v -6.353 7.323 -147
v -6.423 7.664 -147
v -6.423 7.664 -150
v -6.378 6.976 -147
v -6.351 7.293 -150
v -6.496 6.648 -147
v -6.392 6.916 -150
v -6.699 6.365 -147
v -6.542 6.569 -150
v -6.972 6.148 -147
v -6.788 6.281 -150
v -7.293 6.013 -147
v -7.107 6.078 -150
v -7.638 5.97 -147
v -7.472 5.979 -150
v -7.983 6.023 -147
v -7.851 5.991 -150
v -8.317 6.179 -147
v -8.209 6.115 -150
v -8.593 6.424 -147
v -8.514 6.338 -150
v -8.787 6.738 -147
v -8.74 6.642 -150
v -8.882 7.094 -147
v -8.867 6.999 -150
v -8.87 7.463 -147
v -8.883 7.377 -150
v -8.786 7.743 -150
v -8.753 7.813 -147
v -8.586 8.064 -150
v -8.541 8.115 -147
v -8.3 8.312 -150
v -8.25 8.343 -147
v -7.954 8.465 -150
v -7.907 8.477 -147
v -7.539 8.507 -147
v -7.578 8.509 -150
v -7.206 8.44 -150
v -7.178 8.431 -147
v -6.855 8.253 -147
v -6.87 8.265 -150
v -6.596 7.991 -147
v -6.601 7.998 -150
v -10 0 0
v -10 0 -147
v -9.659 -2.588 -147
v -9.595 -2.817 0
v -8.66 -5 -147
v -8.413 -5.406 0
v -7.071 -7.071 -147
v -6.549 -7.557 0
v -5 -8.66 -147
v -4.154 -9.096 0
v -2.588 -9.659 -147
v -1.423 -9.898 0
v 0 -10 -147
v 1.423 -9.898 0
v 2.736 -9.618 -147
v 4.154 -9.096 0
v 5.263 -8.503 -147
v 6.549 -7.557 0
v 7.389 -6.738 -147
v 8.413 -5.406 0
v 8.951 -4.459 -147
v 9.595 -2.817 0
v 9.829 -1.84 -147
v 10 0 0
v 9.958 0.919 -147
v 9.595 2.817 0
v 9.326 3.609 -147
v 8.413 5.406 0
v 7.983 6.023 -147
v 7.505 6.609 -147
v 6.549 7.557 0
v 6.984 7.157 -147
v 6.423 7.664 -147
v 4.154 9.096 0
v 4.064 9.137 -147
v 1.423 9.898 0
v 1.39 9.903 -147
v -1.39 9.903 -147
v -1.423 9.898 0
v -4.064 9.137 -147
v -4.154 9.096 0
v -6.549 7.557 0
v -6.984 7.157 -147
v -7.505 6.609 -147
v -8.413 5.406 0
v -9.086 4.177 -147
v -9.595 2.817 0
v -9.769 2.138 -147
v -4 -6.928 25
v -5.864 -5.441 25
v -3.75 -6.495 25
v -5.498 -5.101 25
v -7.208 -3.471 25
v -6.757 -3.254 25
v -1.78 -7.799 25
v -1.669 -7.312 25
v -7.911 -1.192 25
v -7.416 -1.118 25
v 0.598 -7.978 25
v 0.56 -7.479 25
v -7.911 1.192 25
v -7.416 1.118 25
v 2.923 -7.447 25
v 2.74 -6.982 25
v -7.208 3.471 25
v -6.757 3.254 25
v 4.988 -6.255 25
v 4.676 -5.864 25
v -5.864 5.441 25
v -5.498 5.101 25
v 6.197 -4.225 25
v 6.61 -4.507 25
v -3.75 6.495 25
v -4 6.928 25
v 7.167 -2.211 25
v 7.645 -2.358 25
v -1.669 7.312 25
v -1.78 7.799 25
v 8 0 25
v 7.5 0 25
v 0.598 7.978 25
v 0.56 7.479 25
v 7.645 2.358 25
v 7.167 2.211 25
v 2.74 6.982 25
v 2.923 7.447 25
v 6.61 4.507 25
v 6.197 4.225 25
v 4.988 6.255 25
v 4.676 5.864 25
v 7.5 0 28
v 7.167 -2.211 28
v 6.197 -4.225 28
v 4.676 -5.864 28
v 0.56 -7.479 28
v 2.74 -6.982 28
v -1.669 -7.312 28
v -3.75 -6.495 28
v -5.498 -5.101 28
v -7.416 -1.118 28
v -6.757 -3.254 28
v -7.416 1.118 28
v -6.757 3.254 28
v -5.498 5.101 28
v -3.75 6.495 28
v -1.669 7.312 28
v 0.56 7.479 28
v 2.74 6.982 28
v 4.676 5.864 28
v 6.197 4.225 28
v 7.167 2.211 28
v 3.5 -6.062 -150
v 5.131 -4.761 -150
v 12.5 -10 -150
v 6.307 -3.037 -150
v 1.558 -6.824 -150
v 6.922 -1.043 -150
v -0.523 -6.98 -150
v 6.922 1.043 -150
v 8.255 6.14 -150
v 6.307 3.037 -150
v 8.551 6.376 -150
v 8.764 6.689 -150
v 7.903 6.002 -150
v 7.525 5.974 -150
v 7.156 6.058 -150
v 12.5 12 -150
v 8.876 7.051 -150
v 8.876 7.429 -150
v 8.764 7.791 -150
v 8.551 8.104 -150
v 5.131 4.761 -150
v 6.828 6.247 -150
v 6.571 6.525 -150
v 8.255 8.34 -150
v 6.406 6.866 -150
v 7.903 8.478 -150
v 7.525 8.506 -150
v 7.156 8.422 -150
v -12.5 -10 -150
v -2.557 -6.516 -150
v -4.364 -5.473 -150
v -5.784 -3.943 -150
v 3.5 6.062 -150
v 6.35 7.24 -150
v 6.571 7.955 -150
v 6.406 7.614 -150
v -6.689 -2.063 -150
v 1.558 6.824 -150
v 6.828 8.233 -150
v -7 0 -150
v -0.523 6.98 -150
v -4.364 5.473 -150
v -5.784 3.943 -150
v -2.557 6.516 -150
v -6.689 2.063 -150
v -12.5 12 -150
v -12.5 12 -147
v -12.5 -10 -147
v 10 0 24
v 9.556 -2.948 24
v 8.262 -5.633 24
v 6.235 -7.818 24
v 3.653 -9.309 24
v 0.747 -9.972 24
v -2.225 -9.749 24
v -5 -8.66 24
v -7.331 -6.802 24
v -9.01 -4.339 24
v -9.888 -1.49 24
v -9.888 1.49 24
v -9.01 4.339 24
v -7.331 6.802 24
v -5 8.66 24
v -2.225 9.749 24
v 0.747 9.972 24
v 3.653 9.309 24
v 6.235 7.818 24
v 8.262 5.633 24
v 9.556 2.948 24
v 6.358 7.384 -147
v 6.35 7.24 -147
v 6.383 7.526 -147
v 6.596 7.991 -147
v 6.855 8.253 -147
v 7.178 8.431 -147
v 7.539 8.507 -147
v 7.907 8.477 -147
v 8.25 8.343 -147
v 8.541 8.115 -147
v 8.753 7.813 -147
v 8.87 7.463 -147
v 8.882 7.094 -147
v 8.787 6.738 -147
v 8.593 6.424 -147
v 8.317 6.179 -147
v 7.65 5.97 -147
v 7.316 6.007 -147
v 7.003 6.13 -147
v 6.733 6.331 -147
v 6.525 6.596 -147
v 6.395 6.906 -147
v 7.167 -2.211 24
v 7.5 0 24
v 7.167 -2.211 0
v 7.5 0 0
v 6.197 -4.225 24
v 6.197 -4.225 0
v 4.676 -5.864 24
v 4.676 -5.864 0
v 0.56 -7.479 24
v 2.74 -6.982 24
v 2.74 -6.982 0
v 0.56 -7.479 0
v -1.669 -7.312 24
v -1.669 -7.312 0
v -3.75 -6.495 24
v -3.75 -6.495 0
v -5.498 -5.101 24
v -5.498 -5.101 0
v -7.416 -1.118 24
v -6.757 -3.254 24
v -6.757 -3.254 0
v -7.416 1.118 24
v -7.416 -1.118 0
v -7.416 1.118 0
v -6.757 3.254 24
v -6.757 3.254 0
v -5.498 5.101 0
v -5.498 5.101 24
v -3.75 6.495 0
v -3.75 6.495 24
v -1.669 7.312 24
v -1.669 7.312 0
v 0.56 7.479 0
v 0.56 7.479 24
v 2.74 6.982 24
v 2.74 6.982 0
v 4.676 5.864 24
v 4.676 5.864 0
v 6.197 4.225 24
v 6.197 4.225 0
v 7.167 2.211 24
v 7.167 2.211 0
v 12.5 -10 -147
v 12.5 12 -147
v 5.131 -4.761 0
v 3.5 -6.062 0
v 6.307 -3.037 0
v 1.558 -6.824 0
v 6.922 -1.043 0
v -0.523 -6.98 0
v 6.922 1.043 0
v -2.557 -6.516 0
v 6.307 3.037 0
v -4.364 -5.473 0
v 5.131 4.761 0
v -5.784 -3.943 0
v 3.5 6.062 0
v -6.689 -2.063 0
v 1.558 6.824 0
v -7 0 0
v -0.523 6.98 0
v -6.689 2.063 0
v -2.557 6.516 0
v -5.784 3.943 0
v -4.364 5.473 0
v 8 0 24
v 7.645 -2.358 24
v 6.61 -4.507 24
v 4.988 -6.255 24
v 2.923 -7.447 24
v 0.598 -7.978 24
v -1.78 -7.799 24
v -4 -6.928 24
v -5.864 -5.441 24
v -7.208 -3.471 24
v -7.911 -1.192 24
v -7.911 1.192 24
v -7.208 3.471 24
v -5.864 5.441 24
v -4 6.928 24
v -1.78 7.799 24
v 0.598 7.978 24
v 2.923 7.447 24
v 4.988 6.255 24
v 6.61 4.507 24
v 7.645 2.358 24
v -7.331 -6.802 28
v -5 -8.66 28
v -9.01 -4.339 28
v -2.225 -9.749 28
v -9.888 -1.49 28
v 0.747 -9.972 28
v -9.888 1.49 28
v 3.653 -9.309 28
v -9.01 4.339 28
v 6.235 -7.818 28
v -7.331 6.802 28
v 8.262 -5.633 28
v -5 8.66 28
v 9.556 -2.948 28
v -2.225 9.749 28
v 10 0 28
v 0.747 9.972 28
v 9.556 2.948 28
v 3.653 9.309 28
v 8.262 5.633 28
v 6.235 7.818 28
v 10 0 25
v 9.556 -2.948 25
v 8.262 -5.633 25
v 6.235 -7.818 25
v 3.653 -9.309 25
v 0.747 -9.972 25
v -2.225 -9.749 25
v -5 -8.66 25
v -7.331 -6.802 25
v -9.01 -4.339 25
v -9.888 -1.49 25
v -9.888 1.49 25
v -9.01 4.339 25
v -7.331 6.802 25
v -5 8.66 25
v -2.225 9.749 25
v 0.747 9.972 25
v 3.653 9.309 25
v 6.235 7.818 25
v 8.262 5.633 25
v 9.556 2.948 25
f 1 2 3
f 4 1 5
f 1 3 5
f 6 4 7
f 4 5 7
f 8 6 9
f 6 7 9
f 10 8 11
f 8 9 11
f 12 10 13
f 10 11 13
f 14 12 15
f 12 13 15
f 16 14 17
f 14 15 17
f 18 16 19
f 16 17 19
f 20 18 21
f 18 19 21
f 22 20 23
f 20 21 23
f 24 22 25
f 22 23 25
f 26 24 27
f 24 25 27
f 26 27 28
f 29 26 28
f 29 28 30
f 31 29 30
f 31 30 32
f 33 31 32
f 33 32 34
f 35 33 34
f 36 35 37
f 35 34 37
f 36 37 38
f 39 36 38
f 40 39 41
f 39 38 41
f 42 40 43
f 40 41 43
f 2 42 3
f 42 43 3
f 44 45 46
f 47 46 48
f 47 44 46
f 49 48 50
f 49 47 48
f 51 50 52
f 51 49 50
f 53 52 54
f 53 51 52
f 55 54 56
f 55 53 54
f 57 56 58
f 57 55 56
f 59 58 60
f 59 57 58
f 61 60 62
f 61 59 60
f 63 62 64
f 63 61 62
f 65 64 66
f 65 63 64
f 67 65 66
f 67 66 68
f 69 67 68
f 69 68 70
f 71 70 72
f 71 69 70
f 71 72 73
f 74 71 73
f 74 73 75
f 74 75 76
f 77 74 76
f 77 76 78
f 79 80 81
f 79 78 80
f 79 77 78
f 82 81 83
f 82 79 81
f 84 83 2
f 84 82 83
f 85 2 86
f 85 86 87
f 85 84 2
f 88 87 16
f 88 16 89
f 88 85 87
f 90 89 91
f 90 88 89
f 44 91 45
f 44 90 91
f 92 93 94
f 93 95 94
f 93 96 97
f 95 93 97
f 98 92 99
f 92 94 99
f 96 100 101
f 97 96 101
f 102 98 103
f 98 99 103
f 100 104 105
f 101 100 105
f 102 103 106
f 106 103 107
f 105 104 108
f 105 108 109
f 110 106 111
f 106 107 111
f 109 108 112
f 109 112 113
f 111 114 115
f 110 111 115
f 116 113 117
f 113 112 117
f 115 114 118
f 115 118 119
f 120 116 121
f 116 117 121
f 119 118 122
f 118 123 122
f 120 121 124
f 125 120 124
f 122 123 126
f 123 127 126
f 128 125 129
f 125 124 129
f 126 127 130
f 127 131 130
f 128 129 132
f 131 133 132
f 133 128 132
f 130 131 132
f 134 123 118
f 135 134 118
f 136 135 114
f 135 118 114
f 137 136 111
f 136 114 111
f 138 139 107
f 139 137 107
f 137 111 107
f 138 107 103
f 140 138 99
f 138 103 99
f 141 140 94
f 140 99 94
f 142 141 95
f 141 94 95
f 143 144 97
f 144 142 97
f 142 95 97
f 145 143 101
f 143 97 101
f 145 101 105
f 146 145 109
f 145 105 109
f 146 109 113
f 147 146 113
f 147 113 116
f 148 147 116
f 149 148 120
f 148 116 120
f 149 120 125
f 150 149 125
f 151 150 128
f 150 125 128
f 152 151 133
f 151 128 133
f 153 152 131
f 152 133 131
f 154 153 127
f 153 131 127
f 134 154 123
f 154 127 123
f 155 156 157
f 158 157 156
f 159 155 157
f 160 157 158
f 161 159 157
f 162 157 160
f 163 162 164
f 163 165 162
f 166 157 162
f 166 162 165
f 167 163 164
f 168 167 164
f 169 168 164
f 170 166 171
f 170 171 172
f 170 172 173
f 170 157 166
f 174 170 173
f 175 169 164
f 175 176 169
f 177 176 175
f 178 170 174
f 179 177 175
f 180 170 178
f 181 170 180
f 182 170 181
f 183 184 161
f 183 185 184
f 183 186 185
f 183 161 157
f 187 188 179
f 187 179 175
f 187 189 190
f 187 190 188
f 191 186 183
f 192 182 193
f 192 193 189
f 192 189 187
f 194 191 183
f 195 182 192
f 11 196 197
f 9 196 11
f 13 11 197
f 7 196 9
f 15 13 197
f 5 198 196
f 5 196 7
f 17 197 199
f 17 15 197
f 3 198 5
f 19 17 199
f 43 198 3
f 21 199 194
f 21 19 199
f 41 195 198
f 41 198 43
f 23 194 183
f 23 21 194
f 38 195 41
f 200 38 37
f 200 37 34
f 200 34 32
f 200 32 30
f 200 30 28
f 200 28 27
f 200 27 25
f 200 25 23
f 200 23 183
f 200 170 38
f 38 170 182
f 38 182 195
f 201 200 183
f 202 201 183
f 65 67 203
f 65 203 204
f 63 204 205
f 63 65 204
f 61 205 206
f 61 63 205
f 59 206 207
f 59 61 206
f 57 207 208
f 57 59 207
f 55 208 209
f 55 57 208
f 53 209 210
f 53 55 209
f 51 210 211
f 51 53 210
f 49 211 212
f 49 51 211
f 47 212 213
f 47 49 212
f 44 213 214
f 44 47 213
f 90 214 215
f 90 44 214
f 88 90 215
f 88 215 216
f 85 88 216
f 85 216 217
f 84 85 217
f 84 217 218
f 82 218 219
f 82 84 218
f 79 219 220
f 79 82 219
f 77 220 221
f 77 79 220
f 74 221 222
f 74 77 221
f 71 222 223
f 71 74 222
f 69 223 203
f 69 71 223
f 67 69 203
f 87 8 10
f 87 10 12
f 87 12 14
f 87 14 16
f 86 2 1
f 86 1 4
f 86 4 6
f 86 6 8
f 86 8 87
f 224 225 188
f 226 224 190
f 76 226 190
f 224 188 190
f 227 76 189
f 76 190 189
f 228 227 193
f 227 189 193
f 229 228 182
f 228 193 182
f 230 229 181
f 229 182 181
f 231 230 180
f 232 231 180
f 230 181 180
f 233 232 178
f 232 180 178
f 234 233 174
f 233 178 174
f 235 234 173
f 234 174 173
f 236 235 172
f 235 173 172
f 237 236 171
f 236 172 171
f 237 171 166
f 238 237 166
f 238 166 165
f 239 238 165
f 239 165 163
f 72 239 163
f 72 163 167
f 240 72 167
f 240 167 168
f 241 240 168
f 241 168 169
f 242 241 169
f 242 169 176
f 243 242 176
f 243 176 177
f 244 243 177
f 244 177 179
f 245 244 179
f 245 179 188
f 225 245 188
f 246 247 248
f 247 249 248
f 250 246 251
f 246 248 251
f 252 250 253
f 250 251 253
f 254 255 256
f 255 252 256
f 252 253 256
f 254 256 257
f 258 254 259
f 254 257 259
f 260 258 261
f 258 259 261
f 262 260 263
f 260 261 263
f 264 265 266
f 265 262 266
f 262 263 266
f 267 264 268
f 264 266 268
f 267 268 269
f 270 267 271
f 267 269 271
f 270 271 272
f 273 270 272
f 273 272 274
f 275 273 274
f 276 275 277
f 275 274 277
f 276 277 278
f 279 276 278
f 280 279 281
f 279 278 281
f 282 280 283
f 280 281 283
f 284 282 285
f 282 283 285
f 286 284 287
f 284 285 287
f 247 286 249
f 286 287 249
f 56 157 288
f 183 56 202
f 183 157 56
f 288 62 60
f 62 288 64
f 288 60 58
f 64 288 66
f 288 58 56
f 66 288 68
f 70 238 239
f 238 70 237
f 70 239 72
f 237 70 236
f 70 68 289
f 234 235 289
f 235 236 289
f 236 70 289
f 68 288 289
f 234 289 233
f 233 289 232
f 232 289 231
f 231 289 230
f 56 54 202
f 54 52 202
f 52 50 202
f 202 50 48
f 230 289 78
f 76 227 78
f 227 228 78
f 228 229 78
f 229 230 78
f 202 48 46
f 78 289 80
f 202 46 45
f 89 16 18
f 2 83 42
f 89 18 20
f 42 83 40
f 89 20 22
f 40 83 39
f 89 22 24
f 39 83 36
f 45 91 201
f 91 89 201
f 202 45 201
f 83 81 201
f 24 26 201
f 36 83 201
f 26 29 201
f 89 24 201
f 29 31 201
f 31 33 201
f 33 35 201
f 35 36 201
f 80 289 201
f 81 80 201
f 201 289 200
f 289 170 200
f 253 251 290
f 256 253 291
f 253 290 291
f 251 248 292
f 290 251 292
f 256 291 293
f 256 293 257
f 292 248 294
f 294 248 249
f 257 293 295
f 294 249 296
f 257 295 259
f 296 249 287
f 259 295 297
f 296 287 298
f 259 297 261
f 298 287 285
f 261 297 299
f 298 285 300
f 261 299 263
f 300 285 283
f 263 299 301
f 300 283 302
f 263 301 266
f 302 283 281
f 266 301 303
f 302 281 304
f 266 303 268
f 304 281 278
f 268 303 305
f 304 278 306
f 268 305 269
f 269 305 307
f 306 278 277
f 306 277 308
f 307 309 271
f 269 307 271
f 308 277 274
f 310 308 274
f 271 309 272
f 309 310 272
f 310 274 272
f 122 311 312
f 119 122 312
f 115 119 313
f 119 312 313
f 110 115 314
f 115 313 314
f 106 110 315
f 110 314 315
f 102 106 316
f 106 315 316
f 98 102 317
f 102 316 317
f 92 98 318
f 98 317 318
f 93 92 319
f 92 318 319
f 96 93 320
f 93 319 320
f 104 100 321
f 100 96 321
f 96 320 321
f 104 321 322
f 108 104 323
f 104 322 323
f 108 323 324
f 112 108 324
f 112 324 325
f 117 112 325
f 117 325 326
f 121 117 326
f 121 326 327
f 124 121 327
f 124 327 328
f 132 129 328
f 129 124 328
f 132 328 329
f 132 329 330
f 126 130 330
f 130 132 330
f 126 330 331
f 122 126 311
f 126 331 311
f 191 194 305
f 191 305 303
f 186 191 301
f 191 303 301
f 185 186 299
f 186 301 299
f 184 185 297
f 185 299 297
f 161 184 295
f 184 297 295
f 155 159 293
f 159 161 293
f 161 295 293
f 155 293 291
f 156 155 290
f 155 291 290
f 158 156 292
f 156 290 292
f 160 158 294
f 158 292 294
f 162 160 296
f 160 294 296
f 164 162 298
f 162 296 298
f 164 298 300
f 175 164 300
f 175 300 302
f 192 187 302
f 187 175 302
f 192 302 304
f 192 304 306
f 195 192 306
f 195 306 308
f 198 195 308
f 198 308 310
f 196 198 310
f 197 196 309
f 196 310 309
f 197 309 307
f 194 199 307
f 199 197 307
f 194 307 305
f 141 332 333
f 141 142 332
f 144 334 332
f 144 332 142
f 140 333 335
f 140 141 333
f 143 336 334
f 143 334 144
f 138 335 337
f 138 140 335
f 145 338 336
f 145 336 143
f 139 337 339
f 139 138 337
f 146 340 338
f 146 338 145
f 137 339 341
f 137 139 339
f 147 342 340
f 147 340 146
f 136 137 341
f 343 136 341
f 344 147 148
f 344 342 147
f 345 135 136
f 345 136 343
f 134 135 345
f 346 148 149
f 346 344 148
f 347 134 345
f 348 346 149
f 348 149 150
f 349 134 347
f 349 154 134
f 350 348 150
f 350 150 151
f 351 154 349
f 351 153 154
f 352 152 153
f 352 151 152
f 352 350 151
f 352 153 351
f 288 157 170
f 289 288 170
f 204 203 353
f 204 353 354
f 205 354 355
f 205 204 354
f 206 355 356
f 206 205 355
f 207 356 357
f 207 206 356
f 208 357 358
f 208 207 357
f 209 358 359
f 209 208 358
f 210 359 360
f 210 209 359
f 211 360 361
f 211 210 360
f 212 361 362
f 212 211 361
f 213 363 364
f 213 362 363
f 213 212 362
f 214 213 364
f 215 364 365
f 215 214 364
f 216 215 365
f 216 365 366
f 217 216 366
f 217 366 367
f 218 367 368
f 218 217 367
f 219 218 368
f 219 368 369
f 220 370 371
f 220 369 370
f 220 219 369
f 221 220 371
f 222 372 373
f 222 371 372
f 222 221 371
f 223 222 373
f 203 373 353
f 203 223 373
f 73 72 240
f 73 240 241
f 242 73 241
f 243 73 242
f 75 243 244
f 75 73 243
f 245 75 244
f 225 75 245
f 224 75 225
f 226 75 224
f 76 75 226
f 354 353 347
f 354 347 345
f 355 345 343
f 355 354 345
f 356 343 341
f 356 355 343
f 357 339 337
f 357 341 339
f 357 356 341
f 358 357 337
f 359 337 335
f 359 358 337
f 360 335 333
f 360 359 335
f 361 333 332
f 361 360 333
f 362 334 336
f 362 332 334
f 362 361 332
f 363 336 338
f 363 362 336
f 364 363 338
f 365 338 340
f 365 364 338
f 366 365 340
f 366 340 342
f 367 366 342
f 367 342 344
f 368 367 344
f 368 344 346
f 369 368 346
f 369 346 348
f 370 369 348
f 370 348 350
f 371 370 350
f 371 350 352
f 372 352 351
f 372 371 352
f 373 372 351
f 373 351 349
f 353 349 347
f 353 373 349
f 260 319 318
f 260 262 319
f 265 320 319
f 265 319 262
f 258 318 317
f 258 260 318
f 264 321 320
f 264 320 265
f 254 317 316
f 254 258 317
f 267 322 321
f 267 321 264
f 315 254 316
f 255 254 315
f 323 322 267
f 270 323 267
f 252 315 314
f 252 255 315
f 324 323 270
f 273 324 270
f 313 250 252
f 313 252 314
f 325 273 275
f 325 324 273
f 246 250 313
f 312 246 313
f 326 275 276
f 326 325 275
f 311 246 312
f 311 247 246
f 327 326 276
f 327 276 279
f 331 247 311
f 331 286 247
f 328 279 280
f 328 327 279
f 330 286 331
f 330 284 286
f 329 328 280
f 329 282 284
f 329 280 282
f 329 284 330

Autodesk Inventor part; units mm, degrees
ref_plane "YZ Plane" through (0, 0, 0) normal (1, 0, 0) x (0, 1, 0)
ref_plane "XZ Plane" through (0, 0, 0) normal (0, 1, 0) x (-1, 0, 0)
ref_plane "XY Plane" through (0, 0, 0) normal (0, 0, 1) x (1, 0, 0)
sketch "Sketch1" plane through (0, 0, 0) normal (0, 0, 1) x (1, 0, 0)
  circle A0 centre (0, 0) radius 7.5
  circle A1 centre (0, 0) radius 10
  dimension "d0" = 15
  dimension "d1" = 20
extrude "Extrusion1" add sketch "Sketch1" along normal blind 24
sketch "Sketch2" plane through (0, 0, 0) normal (0, 0, -1) x (-1, 0, 0)
  circle A0 centre (0, 0) radius 7
  circle A1 centre (0, 0) radius 7.5 projected
  circle A2 centre (0, 0) radius 10 projected
  circle A3 centre (0, 0) radius 7.5 projected
  circle A4 centre (0, 0) radius 10 projected
  circle A5 centre (0, 0) radius 7.5 projected
  circle A6 centre (0, 0) radius 10 projected
  circle A7 centre (0, 0) radius 7.5 projected
  dimension "d4" = 14
extrude "Extrusion2" add sketch "Sketch2" along normal blind 150 contours A1 | A2
sketch "Sketch3" plane through (0, 0, 24) normal (0, 0, 1) x (1, 0, 0)
  circle A0 centre (0, 0) radius 10 projected
  circle A1 centre (0, 0) radius 7.5 projected
  circle A2 centre (0, 0) radius 8
  dimension "d7" = 0.5
extrude "Extrusion3" add sketch "Sketch3" along normal blind 1 contours A0
sketch "Sketch4" plane through (0, 0, 25) normal (0, 0, 1) x (1, 0, 0)
  circle A0 centre (0, 0) radius 10 projected
  circle A1 centre (0, 0) radius 7.5 projected
extrude "Extrusion4" add sketch "Sketch4" along normal blind 3
sketch "Sketch5" plane through (0, 0, -150) normal (0, 0, -1) x (-1, 0, 0)
  line L0 (-12.5, -10) -> (12.5, -10)
  circle A0 centre (0, 0) radius 10 projected
  line L1 (-12.5, -10) -> (-12.5, 12)
  line L2 (-12.5, 12) -> (12.5, 12)
  line L3 (12.5, 12) -> (12.5, -10)
  circle A1 centre (-7.62, 7.24) radius 1.27
  circle A2 centre (7.62, 7.24) radius 1.27
  line L4 (-7.62, 7.24) -> (7.62, 7.24) construction
  point P0 (0, 7.24)
  point P1 (0, -10)
  point P2 (0, -10)
  point P3 (-7.9828, 6.0229)
  point P4 (-6.423, 7.6645)
  point P5 (6.423, 7.6645)
  point P6 (7.9828, 6.0229)
  dimension "d12" = 25
  dimension "d13" = 22
  dimension "d14" = 15.24
  dimension "d15" = 17.24
  dimension "d16" = 2.54
extrude "Extrusion5" add sketch "Sketch5" against normal blind 3
extrude "Extrusion6" cut sketch "Sketch5" against normal blind 3 contours A1 A0 | A0 A1 | A2 A0 | A0 A2
